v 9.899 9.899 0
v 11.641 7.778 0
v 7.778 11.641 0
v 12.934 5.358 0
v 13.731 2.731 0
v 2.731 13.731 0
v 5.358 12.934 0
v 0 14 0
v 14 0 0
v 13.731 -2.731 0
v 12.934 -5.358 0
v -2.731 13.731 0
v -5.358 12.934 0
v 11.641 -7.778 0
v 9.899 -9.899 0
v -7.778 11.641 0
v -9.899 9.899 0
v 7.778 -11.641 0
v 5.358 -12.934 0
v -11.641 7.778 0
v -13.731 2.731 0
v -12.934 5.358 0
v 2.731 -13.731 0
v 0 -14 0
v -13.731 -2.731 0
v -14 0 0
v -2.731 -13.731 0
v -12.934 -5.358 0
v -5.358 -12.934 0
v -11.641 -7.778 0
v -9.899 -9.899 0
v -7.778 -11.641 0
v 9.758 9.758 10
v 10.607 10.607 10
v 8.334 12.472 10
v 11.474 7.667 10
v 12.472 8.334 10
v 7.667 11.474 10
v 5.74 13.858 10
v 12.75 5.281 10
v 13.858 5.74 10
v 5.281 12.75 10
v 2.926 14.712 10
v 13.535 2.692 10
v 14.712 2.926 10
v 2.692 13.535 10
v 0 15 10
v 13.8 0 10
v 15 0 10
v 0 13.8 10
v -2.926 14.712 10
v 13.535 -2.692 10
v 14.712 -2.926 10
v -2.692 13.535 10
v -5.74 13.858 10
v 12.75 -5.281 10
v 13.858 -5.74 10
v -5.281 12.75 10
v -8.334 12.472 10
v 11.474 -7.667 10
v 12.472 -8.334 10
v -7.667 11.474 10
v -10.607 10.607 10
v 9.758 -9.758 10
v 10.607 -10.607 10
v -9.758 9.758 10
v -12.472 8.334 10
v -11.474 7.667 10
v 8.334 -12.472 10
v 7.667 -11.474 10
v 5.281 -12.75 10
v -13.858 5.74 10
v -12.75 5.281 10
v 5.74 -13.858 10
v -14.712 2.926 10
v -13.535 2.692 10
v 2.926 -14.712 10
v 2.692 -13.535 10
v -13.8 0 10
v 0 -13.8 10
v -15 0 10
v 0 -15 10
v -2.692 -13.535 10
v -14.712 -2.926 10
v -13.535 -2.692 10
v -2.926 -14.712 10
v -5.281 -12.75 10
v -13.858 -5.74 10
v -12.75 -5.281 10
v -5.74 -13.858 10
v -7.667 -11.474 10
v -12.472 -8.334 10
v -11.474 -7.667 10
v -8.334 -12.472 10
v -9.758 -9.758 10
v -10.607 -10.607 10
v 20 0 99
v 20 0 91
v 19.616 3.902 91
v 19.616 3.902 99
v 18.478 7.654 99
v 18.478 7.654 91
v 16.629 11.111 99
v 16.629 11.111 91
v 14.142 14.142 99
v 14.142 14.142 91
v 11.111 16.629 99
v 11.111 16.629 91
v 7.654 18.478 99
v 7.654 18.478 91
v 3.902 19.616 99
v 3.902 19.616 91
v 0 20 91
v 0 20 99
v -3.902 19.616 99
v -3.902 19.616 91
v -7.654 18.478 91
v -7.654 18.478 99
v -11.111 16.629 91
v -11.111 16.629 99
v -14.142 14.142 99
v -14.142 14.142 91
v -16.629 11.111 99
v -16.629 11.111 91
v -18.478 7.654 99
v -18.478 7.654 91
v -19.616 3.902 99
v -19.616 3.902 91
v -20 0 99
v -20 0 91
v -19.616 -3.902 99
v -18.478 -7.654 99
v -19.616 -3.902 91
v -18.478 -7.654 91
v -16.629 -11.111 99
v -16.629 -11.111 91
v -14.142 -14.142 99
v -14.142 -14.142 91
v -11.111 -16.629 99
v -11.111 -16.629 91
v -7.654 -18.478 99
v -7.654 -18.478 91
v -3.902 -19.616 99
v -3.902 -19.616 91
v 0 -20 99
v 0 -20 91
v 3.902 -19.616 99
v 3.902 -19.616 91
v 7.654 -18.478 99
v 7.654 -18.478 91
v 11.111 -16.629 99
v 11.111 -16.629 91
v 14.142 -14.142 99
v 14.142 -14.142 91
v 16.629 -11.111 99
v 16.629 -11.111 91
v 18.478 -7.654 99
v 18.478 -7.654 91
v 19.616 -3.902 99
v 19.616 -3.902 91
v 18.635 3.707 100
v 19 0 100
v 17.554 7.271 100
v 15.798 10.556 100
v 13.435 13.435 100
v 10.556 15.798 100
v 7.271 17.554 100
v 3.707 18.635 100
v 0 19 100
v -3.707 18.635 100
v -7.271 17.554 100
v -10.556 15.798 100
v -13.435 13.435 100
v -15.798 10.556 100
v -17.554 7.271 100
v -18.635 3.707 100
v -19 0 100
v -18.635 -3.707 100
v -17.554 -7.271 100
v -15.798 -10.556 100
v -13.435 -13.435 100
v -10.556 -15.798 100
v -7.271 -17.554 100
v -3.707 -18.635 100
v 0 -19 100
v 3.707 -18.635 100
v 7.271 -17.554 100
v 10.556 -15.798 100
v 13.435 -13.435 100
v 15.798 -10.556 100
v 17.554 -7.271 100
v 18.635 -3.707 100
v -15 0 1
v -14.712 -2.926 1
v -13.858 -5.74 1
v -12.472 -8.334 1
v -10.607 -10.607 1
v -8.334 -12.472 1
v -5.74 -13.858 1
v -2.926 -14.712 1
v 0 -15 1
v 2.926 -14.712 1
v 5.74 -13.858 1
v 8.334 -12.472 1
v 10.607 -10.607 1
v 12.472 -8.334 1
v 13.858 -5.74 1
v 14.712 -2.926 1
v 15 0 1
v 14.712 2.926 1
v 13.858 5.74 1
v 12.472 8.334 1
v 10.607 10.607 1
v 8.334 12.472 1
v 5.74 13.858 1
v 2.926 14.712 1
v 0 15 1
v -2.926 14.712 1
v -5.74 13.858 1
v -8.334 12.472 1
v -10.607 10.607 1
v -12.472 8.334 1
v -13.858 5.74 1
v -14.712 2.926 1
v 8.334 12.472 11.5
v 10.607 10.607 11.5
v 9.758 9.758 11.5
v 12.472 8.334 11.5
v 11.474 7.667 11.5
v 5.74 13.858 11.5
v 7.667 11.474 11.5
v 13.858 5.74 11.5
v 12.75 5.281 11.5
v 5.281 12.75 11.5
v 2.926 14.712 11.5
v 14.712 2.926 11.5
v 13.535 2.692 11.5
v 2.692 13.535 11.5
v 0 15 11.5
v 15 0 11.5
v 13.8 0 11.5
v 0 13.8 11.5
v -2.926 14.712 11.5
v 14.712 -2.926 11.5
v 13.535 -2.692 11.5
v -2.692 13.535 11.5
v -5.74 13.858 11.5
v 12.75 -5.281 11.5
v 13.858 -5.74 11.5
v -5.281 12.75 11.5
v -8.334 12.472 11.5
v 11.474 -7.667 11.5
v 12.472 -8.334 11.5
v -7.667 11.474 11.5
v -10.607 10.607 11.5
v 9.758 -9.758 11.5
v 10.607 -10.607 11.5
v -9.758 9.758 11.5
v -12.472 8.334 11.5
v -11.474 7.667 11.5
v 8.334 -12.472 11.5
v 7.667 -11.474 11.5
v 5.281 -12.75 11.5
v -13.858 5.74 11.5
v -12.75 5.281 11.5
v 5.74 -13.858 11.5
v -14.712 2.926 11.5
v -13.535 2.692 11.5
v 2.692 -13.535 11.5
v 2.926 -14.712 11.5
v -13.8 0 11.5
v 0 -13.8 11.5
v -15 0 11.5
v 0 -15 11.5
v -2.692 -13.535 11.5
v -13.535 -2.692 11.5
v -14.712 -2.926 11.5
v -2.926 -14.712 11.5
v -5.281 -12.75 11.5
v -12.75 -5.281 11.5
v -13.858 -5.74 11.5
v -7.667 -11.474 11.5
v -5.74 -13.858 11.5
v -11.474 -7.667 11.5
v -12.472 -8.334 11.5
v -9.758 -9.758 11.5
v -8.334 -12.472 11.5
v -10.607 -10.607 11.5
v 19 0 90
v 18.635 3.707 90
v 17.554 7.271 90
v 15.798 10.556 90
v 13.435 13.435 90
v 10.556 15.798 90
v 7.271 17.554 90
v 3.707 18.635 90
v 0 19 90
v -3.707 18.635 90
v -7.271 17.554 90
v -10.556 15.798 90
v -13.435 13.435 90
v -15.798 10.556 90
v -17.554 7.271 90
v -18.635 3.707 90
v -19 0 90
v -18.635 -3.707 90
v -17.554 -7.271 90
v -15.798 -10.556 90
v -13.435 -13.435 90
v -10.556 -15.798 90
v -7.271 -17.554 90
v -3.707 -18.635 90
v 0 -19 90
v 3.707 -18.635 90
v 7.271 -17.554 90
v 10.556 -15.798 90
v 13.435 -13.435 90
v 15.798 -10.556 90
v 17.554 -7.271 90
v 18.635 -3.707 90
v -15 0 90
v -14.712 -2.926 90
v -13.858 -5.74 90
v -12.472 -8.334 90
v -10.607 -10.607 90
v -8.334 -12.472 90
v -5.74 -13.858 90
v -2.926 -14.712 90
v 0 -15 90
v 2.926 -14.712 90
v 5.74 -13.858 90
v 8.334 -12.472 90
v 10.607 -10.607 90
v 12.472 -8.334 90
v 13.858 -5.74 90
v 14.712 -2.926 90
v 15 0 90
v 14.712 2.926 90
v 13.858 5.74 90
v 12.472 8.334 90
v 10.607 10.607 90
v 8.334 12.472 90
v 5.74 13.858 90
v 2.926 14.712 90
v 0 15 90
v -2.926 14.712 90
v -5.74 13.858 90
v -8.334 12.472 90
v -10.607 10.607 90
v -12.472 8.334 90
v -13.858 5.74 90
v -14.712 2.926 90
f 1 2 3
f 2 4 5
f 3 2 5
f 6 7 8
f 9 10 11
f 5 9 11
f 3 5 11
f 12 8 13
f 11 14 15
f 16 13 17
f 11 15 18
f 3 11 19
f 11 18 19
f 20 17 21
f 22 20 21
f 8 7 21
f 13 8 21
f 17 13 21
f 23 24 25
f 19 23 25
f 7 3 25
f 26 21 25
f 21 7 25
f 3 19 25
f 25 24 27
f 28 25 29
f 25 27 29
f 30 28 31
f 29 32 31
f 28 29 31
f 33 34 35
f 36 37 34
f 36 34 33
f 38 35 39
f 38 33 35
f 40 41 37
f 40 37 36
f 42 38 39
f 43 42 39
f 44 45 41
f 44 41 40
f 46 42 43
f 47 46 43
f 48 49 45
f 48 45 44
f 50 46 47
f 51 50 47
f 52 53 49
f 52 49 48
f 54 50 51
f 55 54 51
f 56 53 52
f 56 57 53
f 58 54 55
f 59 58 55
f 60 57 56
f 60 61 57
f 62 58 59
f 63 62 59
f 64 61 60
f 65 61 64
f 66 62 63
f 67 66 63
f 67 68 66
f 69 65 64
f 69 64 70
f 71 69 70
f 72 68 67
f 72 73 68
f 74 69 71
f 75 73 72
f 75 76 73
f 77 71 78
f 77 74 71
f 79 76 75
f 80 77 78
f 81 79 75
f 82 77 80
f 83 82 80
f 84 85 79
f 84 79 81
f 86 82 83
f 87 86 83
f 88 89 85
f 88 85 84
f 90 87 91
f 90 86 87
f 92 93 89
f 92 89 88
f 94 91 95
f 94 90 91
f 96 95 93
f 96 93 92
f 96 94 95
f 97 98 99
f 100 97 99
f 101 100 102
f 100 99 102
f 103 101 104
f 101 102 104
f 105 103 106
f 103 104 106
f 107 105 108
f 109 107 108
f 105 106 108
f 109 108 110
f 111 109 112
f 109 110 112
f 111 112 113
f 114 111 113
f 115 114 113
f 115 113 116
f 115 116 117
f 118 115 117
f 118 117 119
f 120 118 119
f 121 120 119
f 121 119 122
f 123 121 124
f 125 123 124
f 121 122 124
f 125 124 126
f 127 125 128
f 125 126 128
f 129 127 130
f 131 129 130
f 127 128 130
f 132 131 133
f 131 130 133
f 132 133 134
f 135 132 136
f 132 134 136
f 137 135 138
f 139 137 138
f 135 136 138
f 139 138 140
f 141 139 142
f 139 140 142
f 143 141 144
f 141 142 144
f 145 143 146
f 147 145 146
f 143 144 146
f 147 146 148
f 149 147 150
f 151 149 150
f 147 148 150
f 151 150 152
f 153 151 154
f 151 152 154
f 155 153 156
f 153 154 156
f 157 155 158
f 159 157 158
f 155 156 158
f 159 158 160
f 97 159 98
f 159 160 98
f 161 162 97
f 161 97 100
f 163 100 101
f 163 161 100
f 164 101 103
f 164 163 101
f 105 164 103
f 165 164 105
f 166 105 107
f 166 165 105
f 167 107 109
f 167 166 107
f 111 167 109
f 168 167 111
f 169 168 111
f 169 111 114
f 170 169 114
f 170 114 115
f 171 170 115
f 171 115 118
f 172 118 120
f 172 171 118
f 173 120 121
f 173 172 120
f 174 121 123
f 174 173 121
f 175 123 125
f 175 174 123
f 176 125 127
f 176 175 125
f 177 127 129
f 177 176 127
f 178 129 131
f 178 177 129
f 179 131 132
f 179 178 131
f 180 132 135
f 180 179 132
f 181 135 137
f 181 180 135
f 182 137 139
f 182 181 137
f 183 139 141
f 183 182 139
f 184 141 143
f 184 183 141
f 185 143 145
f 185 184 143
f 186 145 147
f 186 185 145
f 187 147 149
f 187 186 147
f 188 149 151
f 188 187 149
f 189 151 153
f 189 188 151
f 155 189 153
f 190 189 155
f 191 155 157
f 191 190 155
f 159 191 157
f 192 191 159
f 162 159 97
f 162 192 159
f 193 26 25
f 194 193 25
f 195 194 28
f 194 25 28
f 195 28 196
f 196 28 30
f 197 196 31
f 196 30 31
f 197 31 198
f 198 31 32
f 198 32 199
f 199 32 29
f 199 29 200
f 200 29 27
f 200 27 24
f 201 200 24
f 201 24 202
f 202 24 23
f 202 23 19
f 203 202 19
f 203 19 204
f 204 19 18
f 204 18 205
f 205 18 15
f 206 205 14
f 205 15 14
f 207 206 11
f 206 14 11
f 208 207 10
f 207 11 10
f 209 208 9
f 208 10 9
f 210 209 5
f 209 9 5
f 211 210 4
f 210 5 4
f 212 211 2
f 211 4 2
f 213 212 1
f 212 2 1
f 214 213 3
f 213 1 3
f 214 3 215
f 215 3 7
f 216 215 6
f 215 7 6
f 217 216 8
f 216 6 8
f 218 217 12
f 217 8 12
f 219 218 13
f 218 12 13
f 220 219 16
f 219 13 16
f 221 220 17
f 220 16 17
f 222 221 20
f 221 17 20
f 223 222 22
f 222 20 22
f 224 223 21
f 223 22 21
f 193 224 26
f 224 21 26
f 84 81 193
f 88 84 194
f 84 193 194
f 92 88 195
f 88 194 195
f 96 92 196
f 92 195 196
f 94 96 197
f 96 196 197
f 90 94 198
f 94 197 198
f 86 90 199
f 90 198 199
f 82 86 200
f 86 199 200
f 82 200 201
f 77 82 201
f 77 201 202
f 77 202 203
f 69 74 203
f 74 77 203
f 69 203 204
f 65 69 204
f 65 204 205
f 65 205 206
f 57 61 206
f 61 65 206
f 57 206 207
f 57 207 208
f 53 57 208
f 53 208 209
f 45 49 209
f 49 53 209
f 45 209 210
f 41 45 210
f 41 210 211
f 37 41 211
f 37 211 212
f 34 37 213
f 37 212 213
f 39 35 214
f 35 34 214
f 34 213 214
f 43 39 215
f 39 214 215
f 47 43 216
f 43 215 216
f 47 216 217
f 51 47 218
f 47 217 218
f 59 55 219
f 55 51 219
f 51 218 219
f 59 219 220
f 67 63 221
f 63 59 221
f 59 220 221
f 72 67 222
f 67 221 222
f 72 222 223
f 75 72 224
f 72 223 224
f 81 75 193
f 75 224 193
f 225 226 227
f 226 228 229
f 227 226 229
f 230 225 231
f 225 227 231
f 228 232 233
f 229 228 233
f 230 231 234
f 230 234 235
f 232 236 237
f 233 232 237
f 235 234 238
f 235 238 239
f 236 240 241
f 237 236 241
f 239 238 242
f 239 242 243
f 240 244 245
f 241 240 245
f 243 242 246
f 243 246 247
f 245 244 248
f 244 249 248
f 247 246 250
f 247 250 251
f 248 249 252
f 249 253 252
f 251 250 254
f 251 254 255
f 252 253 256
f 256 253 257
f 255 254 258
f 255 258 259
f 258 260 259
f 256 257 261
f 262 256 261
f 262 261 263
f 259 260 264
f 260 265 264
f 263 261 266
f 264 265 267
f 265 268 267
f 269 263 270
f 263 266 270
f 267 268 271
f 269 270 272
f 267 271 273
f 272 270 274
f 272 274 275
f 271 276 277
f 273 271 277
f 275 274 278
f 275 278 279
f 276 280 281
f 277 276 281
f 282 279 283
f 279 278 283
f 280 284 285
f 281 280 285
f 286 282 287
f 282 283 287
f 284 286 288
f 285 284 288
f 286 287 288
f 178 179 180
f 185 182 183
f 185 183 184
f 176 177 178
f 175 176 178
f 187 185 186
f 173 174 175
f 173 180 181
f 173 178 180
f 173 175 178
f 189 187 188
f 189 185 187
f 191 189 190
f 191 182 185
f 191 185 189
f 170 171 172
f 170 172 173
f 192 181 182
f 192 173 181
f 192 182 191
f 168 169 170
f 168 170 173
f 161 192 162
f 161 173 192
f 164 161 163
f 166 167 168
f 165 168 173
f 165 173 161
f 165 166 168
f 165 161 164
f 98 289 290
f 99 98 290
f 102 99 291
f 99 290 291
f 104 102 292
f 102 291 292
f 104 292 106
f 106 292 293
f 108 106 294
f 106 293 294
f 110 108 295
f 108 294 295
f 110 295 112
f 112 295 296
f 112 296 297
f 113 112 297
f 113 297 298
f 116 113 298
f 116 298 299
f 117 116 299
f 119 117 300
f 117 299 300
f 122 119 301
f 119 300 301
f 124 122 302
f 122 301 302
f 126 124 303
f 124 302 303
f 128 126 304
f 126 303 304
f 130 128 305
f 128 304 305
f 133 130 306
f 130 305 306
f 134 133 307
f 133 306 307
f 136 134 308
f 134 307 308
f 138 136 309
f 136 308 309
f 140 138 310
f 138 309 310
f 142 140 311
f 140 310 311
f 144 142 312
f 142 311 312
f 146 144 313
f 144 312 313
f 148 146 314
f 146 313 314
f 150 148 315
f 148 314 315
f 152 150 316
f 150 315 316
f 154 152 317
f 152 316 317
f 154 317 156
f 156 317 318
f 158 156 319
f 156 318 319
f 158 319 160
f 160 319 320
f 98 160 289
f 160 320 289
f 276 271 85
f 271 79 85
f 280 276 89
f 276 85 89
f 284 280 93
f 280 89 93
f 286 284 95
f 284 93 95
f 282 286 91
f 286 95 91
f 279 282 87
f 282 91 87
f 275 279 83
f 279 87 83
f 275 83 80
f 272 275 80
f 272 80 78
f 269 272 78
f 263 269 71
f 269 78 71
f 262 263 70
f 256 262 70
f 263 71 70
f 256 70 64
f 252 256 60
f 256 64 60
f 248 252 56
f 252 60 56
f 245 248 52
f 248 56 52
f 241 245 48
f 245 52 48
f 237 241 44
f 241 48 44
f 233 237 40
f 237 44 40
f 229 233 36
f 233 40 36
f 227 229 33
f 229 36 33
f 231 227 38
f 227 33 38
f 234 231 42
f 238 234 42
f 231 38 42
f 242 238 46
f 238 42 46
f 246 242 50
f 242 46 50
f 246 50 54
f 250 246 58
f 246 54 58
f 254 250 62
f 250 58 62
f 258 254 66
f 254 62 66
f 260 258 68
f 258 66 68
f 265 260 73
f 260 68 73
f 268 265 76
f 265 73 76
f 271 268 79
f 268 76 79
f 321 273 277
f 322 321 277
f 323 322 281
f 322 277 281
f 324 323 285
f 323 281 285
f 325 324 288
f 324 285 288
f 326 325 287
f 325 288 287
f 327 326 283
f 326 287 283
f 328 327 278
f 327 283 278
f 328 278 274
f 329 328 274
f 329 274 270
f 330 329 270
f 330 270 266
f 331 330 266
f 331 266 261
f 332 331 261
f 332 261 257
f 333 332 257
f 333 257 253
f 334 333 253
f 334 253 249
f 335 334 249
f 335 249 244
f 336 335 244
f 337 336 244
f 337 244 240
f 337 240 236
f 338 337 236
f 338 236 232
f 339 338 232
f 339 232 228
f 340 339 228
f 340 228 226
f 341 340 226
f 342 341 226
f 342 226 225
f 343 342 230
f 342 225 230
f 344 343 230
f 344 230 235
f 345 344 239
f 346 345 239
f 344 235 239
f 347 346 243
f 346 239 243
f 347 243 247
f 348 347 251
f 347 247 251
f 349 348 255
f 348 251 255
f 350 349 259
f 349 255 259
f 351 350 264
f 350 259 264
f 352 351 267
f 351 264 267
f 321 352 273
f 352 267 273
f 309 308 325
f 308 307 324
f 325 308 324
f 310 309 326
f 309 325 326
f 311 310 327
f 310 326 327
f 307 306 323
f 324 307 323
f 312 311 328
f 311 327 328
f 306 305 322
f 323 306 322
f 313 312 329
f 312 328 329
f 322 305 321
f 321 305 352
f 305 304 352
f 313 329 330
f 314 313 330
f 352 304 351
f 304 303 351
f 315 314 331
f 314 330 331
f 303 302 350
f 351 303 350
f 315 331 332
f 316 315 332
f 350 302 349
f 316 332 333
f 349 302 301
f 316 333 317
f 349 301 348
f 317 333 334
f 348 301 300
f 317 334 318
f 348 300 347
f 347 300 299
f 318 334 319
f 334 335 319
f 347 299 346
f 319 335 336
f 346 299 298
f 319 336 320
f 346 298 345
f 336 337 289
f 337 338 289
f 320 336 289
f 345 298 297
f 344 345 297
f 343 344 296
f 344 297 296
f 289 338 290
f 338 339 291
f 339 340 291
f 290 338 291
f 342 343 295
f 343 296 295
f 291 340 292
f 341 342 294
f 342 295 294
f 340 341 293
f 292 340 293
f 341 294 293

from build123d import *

# Parameters (mm, degrees)
SKETCH_1_R      = 15
EXTRUDE_1_DEPTH = 90
SKETCH_2_R      = 20
EXTRUDE_2_DEPTH = 10
SKETCH_3_W      = 4.032113995
SKETCH_3_H      = 1.5
CHAMFER_1_SIZE  = 1


with BuildPart() as part:
    # 草图1 → 凸台-拉伸1 (new body)
    with BuildSketch(Plane.XY):
        with Locations(Location((0, 0, 0), (0, 0, 180))):
            Circle(SKETCH_1_R)
    extrude(amount=EXTRUDE_1_DEPTH)

    # 草图2 → 凸台-拉伸2 (add)
    with BuildSketch(Plane.XY.offset(90)):
        Circle(SKETCH_2_R)
    extrude(amount=EXTRUDE_2_DEPTH)

    # 草图3 → 切除-旋转1 (revolve, cut)
    with BuildSketch(Plane(origin=(0, 0, 0), x_dir=(1, 0, 0), z_dir=(0, 1, 0))):
        with Locations((-15.816056998, -10.75)):
            Rectangle(SKETCH_3_W, SKETCH_3_H)
    revolve(axis=Axis((0, 0, 0), (0, 0, 1)), mode=Mode.SUBTRACT)

    # 倒角1
    chamfer_1_edges = [part.edges().sort_by_distance(p)[0] for p in [
        (15, 0, 0),
        (-20, 0, 90),
        (-20, 0, 100),
    ]]
    chamfer(chamfer_1_edges, length=CHAMFER_1_SIZE)


solid = part.part
